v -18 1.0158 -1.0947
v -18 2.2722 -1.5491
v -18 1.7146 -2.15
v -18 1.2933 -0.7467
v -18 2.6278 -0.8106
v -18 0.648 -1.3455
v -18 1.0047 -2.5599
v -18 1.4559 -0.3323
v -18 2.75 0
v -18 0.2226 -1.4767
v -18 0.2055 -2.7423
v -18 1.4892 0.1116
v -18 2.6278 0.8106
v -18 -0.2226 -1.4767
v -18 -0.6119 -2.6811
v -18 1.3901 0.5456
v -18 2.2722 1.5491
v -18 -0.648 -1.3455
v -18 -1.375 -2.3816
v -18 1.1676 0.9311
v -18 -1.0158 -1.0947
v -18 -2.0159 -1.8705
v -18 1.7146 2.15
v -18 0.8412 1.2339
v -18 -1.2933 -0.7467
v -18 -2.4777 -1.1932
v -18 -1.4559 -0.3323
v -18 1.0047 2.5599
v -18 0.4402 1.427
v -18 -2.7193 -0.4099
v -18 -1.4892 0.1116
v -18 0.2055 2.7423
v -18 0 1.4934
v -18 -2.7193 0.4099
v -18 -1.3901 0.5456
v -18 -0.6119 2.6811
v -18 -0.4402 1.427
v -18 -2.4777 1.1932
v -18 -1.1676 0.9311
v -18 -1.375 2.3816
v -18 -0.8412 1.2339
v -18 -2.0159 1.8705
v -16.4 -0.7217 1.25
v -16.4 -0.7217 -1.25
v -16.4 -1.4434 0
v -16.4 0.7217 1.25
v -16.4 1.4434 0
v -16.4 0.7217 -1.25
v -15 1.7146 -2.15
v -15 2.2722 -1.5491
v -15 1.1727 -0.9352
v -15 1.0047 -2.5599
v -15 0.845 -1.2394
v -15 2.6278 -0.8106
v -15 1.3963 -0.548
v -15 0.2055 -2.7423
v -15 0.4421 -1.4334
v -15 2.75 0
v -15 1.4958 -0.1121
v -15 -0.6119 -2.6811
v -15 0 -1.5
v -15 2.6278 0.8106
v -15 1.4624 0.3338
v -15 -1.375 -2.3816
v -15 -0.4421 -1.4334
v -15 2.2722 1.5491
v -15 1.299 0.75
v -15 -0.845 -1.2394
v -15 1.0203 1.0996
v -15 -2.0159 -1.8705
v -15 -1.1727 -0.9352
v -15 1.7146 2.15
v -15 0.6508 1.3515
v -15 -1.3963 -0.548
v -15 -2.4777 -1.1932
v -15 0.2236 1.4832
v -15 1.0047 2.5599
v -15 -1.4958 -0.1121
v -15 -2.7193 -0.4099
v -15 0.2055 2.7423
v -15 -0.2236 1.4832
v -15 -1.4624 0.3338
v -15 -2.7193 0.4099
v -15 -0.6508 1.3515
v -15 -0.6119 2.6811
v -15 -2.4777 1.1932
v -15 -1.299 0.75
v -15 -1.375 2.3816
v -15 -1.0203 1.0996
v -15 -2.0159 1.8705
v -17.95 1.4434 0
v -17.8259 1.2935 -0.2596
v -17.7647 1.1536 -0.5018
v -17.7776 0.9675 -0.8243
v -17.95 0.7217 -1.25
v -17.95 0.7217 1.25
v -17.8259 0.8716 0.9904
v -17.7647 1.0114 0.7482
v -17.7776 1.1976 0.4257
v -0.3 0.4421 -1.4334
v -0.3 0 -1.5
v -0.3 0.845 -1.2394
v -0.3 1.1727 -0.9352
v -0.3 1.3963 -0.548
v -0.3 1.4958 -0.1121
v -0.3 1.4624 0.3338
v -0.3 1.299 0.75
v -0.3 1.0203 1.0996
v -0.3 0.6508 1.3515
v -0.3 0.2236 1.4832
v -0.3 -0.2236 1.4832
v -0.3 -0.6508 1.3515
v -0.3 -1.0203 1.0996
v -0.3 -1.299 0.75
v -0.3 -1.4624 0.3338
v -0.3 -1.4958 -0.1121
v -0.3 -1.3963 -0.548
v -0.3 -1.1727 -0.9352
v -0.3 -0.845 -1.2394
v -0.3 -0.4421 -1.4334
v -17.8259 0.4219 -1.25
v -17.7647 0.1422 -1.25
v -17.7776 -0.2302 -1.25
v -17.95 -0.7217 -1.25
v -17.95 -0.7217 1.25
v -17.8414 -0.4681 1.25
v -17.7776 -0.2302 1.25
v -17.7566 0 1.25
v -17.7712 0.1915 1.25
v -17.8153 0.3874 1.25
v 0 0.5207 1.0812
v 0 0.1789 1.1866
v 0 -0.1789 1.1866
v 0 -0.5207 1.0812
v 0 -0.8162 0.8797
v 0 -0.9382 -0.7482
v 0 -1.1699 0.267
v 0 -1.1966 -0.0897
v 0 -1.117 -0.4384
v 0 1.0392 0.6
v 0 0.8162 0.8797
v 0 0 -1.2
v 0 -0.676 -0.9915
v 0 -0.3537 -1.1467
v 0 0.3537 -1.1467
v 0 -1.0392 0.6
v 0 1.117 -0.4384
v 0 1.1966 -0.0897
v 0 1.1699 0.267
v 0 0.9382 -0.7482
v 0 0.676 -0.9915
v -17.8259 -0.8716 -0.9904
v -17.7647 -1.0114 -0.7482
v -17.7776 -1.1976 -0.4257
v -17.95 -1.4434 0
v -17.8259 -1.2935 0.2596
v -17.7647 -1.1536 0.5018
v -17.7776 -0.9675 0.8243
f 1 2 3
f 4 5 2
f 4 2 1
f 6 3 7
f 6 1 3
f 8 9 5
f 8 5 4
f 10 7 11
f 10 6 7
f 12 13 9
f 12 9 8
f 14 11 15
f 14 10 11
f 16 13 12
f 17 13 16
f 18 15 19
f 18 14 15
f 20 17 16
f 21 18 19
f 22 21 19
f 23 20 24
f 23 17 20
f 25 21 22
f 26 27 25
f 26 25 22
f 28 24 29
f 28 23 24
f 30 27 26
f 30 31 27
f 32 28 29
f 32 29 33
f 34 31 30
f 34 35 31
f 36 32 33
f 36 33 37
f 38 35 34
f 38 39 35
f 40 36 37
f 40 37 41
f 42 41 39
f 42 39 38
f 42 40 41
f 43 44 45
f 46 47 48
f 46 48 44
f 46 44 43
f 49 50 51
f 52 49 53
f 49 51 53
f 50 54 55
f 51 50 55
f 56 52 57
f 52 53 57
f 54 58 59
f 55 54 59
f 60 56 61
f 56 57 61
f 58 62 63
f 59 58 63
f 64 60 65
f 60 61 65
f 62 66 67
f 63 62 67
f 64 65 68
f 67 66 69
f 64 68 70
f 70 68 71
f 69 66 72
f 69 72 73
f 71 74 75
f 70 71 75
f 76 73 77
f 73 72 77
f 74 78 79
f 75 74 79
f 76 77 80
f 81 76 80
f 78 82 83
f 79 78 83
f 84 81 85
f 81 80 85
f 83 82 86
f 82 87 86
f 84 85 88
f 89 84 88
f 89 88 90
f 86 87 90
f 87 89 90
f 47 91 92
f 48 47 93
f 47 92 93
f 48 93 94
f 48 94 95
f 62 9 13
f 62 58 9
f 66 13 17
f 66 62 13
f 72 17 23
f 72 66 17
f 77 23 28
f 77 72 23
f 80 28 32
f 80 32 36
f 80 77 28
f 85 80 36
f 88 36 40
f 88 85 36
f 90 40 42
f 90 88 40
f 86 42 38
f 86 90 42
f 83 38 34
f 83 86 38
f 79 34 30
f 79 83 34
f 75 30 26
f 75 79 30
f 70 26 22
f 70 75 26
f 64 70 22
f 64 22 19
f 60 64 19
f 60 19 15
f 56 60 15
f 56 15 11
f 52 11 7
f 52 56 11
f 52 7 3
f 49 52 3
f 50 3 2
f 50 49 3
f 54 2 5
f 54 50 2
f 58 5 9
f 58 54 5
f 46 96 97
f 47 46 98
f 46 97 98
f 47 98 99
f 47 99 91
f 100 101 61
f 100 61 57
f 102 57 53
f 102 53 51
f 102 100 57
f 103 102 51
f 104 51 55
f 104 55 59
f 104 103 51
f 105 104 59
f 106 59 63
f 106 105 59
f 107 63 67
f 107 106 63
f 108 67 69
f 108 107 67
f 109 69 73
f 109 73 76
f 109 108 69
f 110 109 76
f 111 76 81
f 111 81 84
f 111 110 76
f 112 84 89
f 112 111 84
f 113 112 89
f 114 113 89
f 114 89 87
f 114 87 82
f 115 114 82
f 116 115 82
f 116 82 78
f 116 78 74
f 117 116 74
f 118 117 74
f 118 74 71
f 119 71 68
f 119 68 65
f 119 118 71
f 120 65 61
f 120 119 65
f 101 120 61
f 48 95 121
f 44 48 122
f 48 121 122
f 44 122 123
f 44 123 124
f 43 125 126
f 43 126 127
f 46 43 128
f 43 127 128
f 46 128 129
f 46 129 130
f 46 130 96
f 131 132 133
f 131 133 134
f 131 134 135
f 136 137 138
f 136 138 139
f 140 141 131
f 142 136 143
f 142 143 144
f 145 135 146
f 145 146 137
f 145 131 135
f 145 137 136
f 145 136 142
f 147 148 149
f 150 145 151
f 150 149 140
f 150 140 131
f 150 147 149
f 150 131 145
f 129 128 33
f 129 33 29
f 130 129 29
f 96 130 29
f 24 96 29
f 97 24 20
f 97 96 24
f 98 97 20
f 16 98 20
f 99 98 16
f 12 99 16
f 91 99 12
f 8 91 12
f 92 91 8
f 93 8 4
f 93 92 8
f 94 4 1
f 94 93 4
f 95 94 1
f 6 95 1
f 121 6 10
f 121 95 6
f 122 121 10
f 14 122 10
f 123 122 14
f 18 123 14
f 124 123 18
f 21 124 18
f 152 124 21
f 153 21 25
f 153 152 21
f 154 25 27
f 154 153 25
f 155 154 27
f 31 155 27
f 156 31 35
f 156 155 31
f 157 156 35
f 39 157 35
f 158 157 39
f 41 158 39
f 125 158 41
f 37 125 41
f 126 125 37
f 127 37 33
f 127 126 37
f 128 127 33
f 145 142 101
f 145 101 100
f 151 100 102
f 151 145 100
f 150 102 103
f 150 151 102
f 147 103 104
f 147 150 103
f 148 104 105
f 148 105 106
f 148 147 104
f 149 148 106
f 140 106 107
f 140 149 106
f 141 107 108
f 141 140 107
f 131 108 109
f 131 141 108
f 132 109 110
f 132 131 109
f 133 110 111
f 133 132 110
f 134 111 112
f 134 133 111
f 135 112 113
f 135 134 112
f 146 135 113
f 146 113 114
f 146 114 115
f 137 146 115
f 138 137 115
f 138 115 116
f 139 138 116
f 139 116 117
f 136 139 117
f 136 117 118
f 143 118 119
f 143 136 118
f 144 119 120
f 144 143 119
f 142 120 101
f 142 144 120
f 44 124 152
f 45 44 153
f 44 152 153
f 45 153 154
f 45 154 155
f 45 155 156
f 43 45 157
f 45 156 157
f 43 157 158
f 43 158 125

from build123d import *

# Parameters (mm, degrees)
SKETCH2_R           = 1.5
BOSS_EXTRUDE1_DEPTH = 15
CHAMFER1_SIZE       = 0.3
SKETCH6_W           = 3
SKETCH6_H           = 2.75
CUT_EXTRUDE1_DEPTH  = 1.6
SKETCH8_R           = 1.493375673
CUT_EXTRUDE2_DEPTH  = 1
CUT_EXTRUDE2_TAPER  = 45


with BuildPart() as part:
    # Sketch2 → Boss-Extrude1 (new body)
    with BuildSketch(Plane(origin=(0, 0, 0), x_dir=(0, 0, -1), z_dir=(1, 0, 0))):
        Circle(SKETCH2_R)
    extrude(amount=-BOSS_EXTRUDE1_DEPTH)

    # Chamfer1
    chamfer1_edges = [part.edges().sort_by_distance(p)[0] for p in [
        (0, 0, 1.5),
    ]]
    chamfer(chamfer1_edges, length=CHAMFER1_SIZE)

    # Sketch6 → Revolve1 (revolve)
    with BuildSketch(Plane.XY):
        with Locations((-16.5, 1.375)):
            Rectangle(SKETCH6_W, SKETCH6_H)
    revolve(axis=Axis((-15, 0, 0), (1, 0, 0)))

    # Sketch7 → Cut-Extrude1 (cut)
    with BuildSketch(Plane.ZY.offset(18)):
        Polygon((0, 1.443375673), (-1.25, 0.721687836), (-1.25, -0.721687836), (0, -1.443375673), (1.25, -0.721687836), (1.25, 0.721687836), align=None)
    extrude(amount=-CUT_EXTRUDE1_DEPTH, mode=Mode.SUBTRACT)

    # Sketch8 → Cut-Extrude2 (cut)
    with BuildSketch(Plane.ZY.offset(18)):
        Circle(SKETCH8_R)
    extrude(amount=-CUT_EXTRUDE2_DEPTH, taper=CUT_EXTRUDE2_TAPER, mode=Mode.SUBTRACT)


solid = part.part
